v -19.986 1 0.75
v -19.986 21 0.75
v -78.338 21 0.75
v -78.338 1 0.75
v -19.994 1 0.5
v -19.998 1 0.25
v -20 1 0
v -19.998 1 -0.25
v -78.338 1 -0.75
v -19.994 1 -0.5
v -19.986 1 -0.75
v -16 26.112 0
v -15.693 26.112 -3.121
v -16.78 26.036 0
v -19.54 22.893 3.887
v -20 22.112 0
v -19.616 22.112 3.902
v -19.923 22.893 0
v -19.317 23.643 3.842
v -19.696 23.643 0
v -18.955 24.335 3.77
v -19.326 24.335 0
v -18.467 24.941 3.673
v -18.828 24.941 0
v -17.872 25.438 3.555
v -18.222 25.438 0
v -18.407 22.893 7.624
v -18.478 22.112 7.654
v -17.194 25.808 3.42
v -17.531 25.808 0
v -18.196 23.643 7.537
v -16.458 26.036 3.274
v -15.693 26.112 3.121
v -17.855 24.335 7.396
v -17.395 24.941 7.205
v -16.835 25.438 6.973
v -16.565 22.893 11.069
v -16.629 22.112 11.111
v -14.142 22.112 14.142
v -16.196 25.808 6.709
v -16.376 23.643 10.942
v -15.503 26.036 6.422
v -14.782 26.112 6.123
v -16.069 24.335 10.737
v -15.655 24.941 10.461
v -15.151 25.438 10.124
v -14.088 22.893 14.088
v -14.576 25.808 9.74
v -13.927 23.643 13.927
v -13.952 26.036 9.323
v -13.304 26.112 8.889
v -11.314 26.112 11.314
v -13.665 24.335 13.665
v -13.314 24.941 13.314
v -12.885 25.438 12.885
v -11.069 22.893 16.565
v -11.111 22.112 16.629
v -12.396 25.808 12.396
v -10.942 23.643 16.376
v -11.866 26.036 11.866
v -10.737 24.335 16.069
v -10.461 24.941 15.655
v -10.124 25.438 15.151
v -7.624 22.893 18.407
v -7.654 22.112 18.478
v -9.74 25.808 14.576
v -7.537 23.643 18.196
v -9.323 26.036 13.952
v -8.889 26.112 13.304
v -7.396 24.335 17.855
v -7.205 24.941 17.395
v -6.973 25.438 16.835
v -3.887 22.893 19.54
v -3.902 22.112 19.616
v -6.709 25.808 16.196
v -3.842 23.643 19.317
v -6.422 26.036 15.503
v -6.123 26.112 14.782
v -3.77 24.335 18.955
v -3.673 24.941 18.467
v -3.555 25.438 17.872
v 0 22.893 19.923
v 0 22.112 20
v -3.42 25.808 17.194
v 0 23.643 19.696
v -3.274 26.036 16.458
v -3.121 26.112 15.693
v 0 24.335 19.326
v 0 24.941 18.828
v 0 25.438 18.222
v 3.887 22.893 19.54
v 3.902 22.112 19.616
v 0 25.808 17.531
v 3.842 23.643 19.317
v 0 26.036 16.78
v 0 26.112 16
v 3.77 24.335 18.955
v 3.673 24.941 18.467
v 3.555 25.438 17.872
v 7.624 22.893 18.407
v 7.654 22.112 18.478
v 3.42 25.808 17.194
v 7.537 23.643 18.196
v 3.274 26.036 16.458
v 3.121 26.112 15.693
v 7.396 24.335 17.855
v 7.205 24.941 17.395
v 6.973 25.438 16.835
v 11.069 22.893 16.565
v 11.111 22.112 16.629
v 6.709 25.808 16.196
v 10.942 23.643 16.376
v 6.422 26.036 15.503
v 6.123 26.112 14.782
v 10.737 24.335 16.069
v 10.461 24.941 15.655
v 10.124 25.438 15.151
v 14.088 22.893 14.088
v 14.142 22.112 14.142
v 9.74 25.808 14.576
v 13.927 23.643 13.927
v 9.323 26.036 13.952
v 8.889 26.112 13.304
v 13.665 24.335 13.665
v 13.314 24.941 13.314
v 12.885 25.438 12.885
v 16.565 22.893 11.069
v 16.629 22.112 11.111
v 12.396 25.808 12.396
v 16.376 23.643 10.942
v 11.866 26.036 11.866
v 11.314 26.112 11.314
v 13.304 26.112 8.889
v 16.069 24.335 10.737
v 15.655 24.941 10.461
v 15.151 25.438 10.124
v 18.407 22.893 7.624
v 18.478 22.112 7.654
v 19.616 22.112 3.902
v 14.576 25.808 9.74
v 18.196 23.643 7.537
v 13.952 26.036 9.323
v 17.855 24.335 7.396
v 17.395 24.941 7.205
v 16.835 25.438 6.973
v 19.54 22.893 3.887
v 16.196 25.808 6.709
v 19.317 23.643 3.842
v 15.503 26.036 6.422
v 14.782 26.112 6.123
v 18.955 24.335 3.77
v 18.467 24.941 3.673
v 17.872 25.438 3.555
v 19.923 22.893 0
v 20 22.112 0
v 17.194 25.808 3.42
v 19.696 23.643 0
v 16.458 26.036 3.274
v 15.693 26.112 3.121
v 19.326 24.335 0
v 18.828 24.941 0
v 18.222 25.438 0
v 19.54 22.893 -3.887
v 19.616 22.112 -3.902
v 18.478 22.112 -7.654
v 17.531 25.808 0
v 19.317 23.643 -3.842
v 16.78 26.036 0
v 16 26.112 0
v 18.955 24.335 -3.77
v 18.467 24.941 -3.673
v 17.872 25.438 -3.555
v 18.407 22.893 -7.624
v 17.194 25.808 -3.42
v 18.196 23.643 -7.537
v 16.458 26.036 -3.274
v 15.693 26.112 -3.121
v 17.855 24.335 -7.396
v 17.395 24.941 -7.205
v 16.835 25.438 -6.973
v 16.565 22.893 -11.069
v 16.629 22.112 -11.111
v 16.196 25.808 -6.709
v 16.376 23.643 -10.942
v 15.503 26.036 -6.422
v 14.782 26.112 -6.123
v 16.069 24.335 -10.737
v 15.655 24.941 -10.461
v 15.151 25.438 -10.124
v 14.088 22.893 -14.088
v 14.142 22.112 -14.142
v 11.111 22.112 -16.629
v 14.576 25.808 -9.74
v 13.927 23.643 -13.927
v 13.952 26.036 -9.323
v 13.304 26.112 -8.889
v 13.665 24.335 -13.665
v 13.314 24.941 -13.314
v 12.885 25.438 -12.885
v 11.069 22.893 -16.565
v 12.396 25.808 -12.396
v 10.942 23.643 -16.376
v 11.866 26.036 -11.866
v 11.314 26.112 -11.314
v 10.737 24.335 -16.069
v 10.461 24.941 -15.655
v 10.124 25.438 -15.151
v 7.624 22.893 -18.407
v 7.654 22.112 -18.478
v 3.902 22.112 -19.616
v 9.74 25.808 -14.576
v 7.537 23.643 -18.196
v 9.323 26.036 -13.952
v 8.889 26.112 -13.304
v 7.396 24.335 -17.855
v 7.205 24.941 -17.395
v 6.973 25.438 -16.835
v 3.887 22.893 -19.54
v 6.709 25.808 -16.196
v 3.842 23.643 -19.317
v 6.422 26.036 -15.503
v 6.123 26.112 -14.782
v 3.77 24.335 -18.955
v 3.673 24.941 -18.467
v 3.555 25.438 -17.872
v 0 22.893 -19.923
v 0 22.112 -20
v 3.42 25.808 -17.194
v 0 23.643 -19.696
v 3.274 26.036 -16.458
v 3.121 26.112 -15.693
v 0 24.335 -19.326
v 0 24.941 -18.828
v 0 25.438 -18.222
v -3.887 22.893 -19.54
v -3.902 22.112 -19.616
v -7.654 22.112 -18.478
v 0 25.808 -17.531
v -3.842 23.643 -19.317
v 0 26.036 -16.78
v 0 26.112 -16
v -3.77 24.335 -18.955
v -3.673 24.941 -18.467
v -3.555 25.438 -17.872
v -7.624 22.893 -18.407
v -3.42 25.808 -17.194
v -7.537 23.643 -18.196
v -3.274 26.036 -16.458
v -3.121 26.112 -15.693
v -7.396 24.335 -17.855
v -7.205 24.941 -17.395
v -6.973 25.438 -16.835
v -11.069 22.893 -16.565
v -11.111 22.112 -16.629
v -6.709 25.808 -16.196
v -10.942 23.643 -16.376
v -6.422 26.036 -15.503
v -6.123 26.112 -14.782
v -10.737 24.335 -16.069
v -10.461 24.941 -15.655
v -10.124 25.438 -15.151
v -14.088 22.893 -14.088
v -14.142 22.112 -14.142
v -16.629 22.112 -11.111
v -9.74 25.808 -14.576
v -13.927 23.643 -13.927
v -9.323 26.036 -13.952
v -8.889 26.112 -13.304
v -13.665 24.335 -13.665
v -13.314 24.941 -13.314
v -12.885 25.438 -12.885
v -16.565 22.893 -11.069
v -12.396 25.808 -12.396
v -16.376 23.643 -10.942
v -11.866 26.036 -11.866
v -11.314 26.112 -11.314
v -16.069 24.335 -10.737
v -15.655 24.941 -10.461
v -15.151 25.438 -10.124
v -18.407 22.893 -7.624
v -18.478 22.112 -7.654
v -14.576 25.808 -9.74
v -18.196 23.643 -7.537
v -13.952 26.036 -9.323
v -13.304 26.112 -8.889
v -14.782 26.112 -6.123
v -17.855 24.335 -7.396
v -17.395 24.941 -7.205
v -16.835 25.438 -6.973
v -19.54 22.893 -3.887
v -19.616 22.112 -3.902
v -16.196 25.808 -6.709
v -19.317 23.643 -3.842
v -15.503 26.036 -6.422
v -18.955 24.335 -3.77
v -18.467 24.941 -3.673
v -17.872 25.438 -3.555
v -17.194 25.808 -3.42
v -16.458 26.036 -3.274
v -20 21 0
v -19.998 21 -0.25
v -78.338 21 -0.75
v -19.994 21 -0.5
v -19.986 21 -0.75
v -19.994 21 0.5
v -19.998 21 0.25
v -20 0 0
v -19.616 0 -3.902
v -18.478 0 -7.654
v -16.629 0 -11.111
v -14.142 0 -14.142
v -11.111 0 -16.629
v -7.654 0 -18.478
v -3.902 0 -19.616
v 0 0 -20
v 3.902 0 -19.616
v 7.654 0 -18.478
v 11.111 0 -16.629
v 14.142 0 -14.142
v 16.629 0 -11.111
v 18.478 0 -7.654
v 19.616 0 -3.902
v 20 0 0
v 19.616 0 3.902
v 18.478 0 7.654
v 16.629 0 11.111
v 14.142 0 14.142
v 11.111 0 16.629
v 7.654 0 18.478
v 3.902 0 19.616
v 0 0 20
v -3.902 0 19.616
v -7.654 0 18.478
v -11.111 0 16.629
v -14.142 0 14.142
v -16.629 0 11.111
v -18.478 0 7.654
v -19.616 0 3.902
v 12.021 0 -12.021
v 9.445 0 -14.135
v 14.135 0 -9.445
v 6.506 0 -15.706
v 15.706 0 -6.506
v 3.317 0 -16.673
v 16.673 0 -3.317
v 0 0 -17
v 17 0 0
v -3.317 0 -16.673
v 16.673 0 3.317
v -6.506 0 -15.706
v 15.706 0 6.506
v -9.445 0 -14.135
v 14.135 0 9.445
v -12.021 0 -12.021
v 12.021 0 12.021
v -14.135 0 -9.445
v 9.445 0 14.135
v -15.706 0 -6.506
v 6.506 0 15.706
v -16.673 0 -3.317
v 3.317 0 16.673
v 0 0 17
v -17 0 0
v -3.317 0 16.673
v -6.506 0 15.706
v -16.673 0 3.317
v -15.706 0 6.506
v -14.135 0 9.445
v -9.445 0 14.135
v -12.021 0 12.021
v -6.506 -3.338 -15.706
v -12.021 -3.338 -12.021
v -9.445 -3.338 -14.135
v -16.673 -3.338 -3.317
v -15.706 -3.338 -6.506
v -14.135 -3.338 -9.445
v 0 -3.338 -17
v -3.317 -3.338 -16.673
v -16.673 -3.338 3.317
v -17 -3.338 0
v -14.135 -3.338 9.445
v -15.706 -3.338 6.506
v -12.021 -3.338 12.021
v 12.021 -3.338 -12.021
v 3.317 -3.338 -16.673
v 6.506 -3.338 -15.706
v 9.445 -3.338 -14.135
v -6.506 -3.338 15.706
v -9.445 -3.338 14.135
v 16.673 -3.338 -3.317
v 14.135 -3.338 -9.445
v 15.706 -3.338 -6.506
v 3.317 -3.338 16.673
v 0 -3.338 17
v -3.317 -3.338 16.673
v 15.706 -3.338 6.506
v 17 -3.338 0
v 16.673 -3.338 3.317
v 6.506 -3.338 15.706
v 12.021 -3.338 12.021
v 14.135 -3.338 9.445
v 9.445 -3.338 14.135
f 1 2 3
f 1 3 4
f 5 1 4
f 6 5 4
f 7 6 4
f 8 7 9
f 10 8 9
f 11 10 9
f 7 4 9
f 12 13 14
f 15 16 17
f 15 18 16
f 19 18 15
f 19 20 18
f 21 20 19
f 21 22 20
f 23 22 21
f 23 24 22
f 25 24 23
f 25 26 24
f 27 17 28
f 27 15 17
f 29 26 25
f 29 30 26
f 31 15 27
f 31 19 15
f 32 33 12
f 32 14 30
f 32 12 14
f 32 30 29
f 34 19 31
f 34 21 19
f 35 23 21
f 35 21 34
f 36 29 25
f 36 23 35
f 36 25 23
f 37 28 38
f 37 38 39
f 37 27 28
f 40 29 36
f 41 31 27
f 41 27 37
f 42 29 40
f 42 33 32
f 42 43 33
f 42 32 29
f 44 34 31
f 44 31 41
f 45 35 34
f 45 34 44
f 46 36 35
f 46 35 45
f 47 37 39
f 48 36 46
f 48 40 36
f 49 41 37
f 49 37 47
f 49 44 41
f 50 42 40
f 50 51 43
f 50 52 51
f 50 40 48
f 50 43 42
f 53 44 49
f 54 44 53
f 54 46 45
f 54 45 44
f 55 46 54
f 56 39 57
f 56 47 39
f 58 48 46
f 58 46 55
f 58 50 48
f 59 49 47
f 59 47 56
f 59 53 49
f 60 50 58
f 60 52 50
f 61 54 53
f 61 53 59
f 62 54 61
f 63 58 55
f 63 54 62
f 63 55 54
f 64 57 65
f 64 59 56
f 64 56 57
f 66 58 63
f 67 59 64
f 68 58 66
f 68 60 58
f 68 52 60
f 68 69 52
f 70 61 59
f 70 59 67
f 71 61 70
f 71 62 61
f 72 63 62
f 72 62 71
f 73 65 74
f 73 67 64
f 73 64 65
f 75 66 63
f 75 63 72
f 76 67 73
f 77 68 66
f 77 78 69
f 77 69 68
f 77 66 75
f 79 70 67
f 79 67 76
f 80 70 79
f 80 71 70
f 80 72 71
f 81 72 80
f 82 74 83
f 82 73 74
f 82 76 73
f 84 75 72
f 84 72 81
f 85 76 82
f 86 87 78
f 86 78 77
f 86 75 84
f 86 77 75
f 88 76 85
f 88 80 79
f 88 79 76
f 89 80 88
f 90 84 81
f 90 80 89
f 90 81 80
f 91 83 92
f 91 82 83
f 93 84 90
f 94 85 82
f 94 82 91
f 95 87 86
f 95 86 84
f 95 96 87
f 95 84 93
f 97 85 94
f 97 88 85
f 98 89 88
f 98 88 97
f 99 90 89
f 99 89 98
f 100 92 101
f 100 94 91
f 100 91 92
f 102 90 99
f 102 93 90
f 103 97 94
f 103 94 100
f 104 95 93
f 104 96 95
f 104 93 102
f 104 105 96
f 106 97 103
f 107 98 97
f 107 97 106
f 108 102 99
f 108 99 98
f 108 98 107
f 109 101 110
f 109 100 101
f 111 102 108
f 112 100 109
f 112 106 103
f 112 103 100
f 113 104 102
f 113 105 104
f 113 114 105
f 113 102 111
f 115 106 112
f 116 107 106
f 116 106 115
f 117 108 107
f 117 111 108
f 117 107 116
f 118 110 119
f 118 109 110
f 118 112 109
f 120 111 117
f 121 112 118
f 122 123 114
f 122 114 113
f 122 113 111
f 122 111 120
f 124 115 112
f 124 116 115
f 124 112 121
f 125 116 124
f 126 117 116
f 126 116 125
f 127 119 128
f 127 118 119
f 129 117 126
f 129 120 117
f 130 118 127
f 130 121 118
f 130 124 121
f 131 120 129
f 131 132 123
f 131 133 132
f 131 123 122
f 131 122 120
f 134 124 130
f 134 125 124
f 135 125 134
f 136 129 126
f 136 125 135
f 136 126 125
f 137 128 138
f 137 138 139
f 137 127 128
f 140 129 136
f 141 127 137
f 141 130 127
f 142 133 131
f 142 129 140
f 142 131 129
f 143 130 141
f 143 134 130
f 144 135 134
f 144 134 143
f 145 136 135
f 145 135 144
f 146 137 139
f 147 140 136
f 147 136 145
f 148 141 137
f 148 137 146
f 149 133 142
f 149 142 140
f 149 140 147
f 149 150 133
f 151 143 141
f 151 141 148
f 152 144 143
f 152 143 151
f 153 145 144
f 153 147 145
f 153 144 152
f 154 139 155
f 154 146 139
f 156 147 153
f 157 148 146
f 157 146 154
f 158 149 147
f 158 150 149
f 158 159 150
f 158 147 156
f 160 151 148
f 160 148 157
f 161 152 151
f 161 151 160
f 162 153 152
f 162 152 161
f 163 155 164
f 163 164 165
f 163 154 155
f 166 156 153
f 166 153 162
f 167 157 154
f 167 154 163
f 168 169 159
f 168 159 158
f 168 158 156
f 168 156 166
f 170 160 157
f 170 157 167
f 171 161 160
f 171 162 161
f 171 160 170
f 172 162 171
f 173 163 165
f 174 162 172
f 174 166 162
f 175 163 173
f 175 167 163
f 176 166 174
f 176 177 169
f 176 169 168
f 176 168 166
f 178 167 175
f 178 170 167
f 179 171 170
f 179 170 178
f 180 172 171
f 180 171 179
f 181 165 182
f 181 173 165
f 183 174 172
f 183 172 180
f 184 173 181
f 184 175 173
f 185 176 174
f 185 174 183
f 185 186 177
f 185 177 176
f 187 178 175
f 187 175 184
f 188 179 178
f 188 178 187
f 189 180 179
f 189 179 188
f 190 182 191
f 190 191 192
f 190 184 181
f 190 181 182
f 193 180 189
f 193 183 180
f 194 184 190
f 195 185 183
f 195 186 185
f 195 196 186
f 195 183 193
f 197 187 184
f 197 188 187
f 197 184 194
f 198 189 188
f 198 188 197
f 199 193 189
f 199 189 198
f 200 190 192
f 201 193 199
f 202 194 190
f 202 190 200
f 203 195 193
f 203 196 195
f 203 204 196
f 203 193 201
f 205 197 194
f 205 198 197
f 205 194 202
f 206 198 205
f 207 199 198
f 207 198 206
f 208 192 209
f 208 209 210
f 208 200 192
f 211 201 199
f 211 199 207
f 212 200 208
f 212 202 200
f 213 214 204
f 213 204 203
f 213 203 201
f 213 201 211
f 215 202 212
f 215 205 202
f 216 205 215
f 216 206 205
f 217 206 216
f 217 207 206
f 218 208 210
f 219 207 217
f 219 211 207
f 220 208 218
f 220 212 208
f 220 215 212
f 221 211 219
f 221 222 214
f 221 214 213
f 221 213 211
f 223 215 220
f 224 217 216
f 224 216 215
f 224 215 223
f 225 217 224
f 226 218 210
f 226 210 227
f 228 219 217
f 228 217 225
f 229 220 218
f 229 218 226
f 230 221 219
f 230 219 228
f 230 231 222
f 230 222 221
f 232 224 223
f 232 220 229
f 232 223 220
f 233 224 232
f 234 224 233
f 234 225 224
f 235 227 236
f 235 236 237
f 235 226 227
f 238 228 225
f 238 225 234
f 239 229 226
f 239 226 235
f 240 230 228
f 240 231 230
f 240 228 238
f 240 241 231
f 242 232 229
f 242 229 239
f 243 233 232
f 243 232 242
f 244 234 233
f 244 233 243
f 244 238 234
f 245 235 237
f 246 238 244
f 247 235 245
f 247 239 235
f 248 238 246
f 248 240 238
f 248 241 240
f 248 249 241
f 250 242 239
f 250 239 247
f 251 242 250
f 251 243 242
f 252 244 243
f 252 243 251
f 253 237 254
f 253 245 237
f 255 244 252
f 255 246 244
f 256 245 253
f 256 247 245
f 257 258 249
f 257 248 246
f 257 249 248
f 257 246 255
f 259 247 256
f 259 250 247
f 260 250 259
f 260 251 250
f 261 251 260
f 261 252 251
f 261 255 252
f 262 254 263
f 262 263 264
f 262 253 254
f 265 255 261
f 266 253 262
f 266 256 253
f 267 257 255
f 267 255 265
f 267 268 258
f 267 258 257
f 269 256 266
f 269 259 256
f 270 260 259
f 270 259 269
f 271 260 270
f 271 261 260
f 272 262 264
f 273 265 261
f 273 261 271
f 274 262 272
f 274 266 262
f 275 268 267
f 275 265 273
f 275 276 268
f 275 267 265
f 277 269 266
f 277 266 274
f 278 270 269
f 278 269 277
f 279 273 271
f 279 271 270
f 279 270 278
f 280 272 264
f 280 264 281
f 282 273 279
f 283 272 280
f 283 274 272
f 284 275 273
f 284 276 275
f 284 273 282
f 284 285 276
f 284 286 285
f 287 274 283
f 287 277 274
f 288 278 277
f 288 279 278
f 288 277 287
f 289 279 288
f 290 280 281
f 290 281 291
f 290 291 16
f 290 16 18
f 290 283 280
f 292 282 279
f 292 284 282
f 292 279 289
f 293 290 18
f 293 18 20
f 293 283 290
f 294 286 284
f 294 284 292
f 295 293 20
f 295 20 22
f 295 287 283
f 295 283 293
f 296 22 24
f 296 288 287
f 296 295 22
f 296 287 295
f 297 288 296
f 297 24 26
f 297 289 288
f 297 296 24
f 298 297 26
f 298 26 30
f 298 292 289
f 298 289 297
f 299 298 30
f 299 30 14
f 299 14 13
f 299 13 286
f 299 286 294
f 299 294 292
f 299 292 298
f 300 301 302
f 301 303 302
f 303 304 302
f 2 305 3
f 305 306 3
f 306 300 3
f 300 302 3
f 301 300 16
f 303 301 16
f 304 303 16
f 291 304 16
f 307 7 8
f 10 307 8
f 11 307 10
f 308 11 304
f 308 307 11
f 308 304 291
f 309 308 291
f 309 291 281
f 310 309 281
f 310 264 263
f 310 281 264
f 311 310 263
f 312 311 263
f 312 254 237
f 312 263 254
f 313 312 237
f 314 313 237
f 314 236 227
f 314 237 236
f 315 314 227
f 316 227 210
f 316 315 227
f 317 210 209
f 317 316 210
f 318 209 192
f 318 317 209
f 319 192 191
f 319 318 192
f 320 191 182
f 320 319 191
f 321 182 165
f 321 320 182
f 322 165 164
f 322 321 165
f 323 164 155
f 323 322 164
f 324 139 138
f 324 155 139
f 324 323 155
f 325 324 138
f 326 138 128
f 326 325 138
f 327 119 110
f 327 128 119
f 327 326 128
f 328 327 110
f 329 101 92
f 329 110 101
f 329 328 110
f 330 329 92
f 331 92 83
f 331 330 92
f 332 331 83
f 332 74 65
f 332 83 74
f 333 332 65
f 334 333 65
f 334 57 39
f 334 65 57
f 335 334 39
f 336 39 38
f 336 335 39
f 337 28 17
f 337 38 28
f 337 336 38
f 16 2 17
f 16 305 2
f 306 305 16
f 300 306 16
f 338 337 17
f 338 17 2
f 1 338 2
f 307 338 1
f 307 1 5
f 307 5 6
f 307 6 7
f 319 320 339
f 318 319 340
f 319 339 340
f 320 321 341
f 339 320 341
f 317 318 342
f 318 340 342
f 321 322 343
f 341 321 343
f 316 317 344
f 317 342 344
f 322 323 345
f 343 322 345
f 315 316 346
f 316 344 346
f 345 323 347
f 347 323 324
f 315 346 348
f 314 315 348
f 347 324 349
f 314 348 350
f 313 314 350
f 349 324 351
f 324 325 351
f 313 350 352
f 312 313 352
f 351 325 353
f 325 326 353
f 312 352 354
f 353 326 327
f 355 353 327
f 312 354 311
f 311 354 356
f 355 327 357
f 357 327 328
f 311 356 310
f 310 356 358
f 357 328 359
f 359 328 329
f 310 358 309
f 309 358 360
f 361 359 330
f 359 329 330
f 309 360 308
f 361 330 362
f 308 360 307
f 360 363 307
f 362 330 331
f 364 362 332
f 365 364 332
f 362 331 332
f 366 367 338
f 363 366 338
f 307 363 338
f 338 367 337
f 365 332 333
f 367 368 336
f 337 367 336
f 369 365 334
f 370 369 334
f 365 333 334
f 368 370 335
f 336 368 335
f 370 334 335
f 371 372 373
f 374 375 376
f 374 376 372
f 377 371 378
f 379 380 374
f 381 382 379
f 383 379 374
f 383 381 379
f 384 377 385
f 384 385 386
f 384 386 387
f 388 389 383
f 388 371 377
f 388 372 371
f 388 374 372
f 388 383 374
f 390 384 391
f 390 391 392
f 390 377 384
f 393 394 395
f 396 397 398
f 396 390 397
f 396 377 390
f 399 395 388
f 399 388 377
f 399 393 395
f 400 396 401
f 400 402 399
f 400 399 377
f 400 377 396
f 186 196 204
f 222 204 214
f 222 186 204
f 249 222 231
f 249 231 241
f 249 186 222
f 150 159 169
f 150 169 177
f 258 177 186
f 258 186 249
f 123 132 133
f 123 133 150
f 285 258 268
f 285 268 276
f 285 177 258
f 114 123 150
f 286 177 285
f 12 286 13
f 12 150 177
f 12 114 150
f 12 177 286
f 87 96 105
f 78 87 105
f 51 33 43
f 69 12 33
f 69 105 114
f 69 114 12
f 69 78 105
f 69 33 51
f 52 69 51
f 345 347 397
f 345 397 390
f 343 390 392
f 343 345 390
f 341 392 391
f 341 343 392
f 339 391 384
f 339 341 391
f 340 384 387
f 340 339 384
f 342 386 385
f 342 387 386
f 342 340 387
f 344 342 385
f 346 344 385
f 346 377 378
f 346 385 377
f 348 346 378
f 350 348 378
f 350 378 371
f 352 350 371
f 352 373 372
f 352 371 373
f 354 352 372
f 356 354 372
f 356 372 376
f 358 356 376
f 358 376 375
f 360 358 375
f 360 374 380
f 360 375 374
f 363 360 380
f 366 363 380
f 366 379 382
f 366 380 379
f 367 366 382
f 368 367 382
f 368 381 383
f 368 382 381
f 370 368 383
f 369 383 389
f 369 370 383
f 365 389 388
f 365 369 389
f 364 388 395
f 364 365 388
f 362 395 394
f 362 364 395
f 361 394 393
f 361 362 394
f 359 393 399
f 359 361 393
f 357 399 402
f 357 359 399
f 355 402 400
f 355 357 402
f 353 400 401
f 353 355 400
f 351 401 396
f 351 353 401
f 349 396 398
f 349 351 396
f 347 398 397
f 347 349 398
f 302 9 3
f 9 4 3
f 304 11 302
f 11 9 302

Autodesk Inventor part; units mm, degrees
ref_plane "XZ Plane" through (0, 0, 0) normal (0, 1, 0) x (-1, 0, 0)
ref_plane "XY Plane" through (0, 0, 0) normal (0, 0, 1) x (1, 0, 0)
sketch "Sketch2" plane through (0, 0, 0) normal (0, 1, 0) x (-1, 0, 0)
  circle A0 centre (0, 0) radius 20
  dimension "d0" = 40
extrude "Extrusion1" add sketch "Sketch2" along normal blind 26.1125
sketch "Sketch3" plane through (0, 0, 0) normal (0, -1, 0) x (1, 0, 0)
  circle A0 centre (0, 0) radius 20 projected
  circle A1 centre (0, 0) radius 17
  dimension "d3" = 3
extrude "Extrusion2" add sketch "Sketch3" along normal blind 3.3375 contours A1
fillet "Fillet1" radius 4 1 edges at (20, 26.1125, 0)
ref_plane "Work Plane1" through (-20, 0, 0) normal (1, 0, 0) x (0, 1, 0)
sketch "Sketch4" plane through (-20, 0, 0) normal (1, 0, 0) x (0, 1, 0)
  line L0 (21, 0.75) -> (1, 0.75)
  line L1 (1, 0.75) -> (1, -0.75)
  line L2 (1, -0.75) -> (21, -0.75)
  line L3 (21, -0.75) -> (21, 0.75)
  point P0 (0, 0)
  dimension "d7" = 20
  dimension "d8" = 0.75
  dimension "d9" = 0.75
  dimension "d10" = 1
extrude "Extrusion3" add sketch "Sketch4" along normal blind 25.2375 and the other way blind 58.3375
properties part number "MagBallHolder"
